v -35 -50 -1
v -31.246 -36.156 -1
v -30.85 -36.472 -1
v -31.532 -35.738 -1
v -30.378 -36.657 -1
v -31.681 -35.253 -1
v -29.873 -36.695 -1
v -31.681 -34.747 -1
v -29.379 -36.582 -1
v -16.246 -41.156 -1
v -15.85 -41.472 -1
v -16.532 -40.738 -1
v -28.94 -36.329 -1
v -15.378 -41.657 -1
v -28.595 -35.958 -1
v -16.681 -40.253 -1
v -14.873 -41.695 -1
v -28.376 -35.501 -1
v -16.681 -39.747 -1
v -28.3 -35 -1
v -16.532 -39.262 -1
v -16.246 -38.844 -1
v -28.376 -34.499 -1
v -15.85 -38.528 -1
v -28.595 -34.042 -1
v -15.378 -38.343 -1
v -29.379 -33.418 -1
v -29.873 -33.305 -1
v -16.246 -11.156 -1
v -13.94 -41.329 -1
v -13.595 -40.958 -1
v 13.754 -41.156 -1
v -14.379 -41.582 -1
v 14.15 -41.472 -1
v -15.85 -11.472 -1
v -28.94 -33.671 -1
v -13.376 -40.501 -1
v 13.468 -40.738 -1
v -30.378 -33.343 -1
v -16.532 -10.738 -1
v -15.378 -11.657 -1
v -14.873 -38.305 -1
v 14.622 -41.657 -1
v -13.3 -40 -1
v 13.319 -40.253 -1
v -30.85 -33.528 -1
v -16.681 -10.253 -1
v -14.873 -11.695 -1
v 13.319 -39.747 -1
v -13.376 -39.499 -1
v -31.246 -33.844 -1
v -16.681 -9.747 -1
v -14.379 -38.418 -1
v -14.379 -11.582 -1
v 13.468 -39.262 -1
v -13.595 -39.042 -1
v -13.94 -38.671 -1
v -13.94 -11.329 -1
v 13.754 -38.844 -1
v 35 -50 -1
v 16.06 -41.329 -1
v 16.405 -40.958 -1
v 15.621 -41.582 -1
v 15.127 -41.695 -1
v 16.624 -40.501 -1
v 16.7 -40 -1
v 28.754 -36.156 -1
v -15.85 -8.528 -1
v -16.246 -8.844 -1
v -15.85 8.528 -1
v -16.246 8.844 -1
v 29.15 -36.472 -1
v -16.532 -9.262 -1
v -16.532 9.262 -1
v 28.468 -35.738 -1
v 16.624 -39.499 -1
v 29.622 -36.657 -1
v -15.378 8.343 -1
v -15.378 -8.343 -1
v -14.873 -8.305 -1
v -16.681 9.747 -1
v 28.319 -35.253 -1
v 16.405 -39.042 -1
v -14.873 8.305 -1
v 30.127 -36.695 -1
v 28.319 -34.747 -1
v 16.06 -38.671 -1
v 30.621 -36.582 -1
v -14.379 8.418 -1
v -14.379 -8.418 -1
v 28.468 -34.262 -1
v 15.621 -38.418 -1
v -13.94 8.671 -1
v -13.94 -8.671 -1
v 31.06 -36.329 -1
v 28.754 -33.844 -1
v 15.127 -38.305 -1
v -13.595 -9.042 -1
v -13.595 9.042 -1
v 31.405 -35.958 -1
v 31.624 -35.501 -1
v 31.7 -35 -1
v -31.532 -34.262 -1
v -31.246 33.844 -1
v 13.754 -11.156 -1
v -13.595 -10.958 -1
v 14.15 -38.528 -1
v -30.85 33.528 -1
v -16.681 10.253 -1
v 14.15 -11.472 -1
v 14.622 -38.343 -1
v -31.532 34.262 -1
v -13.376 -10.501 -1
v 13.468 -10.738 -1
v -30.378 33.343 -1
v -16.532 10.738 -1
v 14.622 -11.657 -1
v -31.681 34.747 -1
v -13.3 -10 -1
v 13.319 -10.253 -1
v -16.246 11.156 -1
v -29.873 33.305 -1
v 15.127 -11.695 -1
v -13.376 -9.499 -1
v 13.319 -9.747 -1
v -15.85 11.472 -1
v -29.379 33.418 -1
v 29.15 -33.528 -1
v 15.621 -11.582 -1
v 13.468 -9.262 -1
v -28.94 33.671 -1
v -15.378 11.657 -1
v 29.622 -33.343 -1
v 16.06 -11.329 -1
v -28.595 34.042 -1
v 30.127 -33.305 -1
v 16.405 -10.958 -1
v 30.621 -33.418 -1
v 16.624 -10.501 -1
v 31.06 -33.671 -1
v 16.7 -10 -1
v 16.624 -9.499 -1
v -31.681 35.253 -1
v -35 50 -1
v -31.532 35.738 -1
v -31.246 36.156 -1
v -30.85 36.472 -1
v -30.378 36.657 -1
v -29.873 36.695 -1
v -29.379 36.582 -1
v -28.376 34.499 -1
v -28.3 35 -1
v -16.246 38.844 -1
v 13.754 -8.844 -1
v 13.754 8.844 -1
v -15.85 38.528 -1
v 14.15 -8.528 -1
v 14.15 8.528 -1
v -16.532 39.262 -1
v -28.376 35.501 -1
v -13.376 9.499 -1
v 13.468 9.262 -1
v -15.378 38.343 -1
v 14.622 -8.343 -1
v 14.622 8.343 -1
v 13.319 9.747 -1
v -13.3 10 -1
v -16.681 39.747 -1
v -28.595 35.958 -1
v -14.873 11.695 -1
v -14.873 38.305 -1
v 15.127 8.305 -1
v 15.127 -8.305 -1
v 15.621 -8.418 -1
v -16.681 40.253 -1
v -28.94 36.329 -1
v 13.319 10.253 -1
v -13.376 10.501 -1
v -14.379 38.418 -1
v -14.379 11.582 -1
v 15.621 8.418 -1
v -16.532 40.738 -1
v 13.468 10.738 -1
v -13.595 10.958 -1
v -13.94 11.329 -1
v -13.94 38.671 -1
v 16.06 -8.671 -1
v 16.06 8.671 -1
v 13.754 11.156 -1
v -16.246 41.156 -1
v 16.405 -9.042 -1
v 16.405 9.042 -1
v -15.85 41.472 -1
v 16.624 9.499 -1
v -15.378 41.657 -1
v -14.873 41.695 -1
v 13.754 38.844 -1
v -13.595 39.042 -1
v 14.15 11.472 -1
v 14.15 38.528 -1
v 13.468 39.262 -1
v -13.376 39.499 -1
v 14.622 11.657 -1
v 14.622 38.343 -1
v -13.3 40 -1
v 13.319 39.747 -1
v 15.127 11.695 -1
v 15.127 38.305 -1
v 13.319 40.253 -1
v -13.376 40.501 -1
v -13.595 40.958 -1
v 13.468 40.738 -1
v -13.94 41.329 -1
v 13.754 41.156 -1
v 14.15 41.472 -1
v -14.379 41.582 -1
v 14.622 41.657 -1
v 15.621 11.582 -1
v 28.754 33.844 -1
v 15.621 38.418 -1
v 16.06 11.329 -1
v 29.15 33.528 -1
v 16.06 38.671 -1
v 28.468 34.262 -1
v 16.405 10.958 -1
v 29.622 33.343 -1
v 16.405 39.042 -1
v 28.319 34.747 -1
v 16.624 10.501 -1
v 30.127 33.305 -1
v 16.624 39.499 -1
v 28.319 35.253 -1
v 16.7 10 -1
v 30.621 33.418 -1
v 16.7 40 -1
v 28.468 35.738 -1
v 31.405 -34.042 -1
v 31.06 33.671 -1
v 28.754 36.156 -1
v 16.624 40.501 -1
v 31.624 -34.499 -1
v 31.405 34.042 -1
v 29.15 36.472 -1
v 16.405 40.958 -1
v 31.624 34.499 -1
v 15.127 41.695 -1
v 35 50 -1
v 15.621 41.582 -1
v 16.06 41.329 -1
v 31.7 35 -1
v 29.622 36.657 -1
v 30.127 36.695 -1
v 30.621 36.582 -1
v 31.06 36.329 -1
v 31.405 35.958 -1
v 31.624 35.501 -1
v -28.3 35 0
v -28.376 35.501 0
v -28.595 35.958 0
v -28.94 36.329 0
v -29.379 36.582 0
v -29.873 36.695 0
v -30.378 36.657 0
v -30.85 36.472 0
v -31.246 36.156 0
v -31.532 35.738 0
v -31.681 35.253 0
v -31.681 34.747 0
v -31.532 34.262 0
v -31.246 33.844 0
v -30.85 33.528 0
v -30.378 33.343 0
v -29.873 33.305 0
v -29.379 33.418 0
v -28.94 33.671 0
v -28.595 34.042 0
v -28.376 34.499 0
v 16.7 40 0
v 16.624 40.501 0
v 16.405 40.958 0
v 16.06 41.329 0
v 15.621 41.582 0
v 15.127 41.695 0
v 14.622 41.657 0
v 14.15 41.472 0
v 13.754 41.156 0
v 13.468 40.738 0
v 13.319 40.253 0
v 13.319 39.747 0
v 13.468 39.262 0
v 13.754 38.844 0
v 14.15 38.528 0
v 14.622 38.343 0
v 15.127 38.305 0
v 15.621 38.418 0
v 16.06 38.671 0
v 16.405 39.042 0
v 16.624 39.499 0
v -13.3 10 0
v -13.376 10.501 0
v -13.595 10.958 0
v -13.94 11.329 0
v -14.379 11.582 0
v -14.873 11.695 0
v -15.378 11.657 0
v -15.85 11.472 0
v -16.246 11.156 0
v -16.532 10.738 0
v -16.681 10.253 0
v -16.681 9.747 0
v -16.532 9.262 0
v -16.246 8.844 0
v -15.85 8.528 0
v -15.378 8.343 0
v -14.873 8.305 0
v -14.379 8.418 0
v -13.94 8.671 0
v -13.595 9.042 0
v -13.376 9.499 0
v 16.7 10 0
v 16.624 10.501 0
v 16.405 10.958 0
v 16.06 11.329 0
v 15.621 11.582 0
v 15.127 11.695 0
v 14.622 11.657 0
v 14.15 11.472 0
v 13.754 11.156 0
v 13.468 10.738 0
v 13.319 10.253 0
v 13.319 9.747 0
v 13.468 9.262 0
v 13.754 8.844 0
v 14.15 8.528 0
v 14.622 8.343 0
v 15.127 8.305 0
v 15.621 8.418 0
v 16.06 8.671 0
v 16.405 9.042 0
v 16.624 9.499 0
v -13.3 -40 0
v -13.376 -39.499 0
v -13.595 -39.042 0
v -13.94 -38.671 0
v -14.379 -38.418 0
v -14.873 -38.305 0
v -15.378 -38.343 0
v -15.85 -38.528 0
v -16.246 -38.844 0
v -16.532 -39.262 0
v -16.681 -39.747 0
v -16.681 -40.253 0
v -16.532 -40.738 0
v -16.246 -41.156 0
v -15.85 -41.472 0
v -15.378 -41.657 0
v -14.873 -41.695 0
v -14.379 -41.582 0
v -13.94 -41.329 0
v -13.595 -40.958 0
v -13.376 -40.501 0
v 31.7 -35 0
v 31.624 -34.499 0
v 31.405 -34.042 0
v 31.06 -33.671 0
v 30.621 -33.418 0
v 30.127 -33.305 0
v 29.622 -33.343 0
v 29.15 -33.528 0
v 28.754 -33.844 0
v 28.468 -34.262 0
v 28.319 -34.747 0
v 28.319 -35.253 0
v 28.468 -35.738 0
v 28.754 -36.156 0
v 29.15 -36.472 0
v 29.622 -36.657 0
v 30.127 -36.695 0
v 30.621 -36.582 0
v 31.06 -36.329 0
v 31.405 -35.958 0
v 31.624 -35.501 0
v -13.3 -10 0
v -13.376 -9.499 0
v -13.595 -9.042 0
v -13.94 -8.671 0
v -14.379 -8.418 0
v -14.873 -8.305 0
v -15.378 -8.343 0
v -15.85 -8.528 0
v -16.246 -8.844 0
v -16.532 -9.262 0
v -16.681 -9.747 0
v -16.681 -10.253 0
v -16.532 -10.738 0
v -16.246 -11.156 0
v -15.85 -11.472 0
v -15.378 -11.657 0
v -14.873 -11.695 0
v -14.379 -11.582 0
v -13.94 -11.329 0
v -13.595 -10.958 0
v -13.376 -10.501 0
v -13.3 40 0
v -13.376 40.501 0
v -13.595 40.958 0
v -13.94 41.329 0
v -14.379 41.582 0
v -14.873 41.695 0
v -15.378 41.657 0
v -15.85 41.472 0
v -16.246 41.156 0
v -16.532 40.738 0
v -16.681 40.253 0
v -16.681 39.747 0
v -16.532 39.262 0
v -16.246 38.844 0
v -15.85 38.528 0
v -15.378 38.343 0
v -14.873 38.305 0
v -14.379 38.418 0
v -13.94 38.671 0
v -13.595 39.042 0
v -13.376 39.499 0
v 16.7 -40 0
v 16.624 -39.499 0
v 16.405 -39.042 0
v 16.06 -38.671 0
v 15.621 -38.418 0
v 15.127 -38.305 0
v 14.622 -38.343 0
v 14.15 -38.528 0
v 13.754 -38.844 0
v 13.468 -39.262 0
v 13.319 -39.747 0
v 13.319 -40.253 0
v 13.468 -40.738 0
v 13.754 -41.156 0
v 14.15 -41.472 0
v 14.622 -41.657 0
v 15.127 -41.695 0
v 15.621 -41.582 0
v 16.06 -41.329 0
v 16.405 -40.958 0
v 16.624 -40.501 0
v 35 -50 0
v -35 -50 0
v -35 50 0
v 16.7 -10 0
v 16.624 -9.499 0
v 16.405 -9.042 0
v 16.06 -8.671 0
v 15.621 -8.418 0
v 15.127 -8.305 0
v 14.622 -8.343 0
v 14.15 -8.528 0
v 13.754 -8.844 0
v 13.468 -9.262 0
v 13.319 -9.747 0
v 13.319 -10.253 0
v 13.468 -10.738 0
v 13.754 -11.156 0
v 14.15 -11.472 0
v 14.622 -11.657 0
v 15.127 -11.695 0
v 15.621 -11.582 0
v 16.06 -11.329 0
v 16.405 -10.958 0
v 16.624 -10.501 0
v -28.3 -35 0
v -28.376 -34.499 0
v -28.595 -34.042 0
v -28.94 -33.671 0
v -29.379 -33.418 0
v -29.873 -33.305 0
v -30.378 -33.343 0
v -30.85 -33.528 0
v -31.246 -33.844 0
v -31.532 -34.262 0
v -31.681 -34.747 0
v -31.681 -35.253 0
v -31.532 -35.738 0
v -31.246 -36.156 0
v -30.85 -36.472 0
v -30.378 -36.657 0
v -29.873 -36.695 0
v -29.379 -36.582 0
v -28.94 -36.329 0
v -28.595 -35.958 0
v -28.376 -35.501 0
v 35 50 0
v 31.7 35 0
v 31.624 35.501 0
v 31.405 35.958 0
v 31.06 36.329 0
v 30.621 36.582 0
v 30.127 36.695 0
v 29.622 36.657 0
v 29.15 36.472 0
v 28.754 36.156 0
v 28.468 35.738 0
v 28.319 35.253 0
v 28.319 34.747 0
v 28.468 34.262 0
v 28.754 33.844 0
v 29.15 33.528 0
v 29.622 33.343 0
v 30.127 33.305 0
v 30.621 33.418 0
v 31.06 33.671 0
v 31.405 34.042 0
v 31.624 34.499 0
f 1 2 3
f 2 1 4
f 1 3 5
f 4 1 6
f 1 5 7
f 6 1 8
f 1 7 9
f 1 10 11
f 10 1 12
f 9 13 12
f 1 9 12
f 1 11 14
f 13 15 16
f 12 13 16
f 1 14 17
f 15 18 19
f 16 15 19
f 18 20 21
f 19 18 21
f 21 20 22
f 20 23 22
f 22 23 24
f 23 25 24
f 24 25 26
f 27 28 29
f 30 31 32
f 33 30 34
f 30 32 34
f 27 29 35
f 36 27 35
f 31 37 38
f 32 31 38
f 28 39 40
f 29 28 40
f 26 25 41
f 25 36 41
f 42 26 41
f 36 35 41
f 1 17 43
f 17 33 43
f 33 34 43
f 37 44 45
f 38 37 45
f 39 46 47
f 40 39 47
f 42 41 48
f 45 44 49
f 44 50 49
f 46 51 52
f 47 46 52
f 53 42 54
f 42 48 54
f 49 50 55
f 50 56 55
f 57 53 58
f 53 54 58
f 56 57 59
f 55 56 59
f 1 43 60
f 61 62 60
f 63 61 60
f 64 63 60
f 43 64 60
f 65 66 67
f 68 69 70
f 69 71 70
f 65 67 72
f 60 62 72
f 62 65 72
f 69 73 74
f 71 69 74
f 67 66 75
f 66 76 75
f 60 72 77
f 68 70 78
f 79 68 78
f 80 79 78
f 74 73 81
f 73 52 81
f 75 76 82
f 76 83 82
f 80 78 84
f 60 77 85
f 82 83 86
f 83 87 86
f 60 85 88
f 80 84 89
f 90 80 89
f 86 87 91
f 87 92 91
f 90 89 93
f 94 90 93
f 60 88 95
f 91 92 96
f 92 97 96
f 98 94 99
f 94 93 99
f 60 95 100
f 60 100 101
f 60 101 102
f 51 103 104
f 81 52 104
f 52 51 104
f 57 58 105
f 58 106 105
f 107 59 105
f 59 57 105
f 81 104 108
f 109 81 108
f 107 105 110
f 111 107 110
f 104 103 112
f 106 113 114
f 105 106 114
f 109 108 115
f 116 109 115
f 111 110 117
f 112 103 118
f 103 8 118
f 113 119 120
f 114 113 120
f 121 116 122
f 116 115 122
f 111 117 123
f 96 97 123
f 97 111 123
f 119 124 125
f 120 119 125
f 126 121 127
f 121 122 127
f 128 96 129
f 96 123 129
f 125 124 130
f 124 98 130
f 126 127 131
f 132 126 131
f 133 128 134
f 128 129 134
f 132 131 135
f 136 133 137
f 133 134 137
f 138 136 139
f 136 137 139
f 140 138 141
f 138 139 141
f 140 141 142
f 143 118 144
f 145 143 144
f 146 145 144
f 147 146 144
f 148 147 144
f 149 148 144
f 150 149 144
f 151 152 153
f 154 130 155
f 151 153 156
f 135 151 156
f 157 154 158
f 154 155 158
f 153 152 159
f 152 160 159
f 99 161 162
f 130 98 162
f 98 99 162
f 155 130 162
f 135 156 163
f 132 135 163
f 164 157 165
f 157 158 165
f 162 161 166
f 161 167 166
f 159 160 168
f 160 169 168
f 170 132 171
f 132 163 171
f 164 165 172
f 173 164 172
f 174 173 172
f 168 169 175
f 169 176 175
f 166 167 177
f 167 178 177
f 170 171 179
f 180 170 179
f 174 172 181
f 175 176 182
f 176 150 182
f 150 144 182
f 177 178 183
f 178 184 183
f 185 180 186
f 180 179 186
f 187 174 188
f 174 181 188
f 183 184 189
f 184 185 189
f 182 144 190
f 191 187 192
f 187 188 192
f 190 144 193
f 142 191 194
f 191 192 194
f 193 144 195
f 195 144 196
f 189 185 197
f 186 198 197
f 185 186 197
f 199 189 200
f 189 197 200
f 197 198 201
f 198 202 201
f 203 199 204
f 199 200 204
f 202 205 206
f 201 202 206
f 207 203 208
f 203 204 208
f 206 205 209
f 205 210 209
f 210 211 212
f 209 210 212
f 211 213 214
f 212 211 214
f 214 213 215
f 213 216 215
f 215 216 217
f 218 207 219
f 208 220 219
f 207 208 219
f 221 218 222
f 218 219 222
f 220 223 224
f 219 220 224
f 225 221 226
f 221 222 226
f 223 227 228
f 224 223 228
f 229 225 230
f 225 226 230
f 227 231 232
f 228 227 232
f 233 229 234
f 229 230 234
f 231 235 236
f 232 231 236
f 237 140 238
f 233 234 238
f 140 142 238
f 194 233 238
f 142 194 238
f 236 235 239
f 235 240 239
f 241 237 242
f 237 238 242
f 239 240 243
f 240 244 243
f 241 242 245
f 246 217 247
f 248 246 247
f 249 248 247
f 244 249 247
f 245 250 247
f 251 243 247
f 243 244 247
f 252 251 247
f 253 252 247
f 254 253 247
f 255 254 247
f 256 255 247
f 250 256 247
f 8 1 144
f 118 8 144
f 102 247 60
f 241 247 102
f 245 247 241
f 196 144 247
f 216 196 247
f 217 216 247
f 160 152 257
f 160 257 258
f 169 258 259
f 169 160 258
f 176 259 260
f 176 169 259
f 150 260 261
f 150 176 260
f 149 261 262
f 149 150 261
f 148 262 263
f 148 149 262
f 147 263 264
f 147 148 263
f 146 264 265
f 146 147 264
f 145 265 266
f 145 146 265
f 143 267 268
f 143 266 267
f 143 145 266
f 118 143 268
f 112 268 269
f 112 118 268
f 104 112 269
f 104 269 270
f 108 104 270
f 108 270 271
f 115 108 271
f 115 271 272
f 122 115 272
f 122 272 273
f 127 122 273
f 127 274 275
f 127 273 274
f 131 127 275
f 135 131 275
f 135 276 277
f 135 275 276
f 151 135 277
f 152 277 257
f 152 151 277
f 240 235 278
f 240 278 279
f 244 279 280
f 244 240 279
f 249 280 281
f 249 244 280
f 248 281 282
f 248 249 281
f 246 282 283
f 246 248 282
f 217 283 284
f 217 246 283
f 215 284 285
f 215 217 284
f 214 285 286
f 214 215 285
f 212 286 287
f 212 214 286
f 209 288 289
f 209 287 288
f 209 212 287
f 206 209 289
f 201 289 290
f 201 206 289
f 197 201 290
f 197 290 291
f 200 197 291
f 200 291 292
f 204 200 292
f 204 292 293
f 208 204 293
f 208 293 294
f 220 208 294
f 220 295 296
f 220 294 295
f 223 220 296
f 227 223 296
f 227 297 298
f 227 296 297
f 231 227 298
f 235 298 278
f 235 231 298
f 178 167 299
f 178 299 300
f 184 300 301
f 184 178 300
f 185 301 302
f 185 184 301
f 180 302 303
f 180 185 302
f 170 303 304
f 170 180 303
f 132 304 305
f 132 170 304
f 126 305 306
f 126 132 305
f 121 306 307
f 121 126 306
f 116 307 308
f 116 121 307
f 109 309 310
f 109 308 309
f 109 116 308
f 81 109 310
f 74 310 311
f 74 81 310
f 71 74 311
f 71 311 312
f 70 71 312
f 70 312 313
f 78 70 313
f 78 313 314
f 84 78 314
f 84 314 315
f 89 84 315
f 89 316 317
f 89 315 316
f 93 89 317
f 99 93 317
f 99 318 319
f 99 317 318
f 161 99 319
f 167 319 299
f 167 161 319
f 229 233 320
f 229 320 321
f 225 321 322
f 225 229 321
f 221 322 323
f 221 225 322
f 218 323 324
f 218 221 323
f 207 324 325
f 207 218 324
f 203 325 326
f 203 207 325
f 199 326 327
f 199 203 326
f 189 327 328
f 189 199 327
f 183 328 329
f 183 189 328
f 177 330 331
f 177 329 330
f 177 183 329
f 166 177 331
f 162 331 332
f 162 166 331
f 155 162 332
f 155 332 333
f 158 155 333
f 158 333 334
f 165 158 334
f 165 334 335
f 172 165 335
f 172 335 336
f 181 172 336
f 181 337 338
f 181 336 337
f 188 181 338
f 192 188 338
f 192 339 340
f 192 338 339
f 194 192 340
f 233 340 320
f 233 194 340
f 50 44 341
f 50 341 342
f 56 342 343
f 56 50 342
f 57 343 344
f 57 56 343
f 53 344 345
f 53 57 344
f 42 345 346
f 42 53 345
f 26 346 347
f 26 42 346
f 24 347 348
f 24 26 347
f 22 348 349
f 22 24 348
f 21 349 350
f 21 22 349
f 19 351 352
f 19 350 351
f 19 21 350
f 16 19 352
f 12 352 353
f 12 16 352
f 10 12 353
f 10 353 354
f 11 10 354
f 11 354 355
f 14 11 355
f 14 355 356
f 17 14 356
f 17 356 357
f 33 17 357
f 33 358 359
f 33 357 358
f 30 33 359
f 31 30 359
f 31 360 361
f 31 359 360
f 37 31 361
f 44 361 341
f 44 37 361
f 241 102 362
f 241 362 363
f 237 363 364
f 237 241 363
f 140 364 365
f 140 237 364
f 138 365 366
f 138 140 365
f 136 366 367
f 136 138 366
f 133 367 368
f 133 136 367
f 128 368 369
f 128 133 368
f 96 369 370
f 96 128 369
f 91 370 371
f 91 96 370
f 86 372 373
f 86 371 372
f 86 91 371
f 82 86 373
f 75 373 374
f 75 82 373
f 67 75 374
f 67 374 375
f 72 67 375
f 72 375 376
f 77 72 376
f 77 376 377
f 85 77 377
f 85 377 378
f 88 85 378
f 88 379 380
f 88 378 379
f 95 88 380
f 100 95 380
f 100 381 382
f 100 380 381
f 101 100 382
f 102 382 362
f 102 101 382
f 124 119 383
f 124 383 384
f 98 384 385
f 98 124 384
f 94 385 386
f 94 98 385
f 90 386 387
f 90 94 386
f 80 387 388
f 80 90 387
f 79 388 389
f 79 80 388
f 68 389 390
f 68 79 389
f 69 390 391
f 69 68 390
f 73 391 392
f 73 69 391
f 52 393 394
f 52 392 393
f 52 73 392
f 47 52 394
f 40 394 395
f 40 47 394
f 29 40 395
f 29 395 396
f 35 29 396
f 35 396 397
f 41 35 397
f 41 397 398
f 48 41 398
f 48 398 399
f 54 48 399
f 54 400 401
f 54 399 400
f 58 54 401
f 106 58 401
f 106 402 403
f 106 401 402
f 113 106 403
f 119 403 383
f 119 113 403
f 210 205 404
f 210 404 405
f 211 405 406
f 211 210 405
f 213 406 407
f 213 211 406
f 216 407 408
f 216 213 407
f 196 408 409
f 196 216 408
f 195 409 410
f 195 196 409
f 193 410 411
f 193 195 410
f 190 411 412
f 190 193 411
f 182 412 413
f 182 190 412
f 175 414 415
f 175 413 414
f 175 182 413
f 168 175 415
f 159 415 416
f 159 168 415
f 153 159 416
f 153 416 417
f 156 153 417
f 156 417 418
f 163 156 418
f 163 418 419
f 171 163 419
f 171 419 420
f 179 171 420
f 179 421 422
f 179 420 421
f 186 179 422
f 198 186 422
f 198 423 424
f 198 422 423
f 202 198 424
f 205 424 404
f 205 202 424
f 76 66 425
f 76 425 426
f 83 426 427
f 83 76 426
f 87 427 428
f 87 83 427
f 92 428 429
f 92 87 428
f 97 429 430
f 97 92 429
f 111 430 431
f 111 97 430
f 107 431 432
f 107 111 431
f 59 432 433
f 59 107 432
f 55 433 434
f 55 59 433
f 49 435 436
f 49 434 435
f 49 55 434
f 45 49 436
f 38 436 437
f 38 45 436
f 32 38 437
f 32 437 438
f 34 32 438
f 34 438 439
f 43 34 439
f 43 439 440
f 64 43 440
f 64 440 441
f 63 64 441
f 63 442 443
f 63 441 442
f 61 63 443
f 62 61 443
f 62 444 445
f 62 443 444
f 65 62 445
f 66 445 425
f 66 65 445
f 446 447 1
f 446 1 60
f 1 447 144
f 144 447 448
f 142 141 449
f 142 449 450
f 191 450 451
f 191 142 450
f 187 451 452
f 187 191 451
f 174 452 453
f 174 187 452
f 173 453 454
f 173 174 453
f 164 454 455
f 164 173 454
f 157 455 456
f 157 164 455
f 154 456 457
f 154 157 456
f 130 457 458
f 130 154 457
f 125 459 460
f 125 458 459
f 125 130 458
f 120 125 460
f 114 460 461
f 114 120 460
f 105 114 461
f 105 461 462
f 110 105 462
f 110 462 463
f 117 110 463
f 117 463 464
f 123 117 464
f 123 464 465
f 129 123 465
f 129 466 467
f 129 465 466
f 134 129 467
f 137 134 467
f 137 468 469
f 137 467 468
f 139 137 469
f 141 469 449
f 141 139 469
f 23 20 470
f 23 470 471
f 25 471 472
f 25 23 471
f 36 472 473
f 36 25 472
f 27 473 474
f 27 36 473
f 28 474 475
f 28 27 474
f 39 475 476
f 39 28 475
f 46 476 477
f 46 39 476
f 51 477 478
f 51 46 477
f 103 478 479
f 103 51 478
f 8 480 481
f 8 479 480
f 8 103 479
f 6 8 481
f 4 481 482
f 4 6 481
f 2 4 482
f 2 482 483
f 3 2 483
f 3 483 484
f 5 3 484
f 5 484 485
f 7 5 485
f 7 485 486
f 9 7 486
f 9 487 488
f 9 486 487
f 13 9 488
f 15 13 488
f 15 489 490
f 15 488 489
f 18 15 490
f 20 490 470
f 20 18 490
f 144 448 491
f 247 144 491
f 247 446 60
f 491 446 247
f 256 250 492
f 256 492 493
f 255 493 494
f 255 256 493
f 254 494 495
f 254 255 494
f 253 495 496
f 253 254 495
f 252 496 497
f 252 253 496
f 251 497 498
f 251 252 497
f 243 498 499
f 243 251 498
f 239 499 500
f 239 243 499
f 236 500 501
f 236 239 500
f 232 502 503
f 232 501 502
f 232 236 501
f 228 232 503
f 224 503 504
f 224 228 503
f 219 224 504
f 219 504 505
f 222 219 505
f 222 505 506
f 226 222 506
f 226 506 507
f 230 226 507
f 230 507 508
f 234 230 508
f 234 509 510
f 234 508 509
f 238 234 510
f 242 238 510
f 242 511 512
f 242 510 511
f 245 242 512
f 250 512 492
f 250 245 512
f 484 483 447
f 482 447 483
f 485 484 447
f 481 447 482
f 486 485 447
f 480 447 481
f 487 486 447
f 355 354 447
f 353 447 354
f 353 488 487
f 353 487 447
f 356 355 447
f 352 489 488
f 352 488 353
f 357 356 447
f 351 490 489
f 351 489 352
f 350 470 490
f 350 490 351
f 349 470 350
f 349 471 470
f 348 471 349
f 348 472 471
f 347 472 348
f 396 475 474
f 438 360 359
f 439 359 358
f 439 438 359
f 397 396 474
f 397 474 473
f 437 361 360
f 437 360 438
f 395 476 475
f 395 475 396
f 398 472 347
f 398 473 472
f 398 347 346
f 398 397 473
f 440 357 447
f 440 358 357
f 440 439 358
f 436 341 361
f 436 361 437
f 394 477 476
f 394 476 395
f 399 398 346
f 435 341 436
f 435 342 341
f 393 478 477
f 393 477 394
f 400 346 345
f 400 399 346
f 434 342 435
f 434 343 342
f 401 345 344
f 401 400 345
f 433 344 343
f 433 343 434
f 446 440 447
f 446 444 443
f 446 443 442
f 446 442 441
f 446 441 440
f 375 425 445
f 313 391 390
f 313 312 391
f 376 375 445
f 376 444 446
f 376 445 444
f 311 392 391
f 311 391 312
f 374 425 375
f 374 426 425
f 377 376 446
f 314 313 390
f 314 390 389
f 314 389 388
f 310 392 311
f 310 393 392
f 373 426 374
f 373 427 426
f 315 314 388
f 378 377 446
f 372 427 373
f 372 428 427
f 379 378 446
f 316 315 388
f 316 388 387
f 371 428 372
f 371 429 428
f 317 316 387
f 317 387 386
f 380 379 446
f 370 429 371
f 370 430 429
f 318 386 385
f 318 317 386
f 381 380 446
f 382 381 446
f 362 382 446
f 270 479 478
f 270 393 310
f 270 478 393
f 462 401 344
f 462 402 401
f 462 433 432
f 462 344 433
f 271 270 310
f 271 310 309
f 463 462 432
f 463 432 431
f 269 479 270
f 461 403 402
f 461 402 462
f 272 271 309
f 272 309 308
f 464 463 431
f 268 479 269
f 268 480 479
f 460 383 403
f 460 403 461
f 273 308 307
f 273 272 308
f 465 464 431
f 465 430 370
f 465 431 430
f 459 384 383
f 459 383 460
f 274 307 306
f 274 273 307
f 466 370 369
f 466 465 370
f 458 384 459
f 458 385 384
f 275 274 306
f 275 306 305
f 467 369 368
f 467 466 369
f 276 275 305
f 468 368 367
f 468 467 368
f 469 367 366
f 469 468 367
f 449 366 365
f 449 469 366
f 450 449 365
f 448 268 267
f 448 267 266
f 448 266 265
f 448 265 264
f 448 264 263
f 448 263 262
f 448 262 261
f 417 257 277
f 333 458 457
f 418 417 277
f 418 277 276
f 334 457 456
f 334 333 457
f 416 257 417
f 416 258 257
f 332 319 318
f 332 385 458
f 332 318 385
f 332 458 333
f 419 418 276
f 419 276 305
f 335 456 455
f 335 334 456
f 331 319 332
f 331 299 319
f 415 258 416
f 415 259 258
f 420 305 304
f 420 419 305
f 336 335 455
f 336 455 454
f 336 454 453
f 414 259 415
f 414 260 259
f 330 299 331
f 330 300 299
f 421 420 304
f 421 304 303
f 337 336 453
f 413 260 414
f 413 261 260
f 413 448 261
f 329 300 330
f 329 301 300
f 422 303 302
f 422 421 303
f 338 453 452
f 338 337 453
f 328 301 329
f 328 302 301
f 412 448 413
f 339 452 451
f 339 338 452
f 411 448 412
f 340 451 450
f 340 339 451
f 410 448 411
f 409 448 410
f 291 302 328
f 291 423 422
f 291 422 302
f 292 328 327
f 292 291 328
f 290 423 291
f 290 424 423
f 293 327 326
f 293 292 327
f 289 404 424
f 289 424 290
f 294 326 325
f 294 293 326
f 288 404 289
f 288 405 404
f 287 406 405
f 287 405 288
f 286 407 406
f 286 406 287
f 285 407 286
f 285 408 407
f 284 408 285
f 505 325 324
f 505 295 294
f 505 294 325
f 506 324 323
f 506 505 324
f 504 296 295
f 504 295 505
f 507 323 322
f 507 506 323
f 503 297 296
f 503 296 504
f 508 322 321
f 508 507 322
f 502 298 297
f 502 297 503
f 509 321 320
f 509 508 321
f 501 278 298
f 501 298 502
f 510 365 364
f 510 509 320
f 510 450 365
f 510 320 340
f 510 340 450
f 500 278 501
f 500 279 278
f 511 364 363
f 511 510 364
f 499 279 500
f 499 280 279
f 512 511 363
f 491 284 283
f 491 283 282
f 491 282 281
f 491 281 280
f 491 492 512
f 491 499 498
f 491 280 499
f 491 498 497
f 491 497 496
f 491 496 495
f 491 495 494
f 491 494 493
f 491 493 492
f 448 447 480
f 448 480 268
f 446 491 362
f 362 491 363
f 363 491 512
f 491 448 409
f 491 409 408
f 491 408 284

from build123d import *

# Parameters (mm, degrees)
SKETCH1_W               = 70
SKETCH1_H               = 100
BOSS_EXTRUDE1_DEPTH     = 1
CUT_EXTRUDE1_DEPTH      = 62.040969848
CUT_EXTRUDE1_DEPTH_BACK = 62.040969848
SKETCH2_R               = 1.7


with BuildPart() as part:
    # Sketch1 → Boss-Extrude1 (new body)
    with BuildSketch(Plane.XY):
        Rectangle(SKETCH1_W, SKETCH1_H)
    extrude(amount=-BOSS_EXTRUDE1_DEPTH)

    # Sketch2 → Cut-Extrude1 (cut, two sides: drawn at the far end of the back side and taken through both)
    with BuildSketch(Plane.XY.offset(-CUT_EXTRUDE1_DEPTH_BACK)):
        with Locations((-30, -35)):
            Circle(SKETCH2_R)
        with Locations((-30, 35)):
            Circle(SKETCH2_R)
        with Locations((30, -35)):
            Circle(SKETCH2_R)
        with Locations((30, 35)):
            Circle(SKETCH2_R)
        with Locations((-15, -40)):
            Circle(SKETCH2_R)
        with Locations((-15, -10)):
            Circle(SKETCH2_R)
        with Locations((-15, 10)):
            Circle(SKETCH2_R)
        with Locations((-15, 40)):
            Circle(SKETCH2_R)
        with Locations((15, -40)):
            Circle(SKETCH2_R)
        with Locations((15, -10)):
            Circle(SKETCH2_R)
        with Locations((15, 10)):
            Circle(SKETCH2_R)
        with Locations((15, 40)):
            Circle(SKETCH2_R)
    extrude(amount=CUT_EXTRUDE1_DEPTH + CUT_EXTRUDE1_DEPTH_BACK, mode=Mode.SUBTRACT)


solid = part.part
